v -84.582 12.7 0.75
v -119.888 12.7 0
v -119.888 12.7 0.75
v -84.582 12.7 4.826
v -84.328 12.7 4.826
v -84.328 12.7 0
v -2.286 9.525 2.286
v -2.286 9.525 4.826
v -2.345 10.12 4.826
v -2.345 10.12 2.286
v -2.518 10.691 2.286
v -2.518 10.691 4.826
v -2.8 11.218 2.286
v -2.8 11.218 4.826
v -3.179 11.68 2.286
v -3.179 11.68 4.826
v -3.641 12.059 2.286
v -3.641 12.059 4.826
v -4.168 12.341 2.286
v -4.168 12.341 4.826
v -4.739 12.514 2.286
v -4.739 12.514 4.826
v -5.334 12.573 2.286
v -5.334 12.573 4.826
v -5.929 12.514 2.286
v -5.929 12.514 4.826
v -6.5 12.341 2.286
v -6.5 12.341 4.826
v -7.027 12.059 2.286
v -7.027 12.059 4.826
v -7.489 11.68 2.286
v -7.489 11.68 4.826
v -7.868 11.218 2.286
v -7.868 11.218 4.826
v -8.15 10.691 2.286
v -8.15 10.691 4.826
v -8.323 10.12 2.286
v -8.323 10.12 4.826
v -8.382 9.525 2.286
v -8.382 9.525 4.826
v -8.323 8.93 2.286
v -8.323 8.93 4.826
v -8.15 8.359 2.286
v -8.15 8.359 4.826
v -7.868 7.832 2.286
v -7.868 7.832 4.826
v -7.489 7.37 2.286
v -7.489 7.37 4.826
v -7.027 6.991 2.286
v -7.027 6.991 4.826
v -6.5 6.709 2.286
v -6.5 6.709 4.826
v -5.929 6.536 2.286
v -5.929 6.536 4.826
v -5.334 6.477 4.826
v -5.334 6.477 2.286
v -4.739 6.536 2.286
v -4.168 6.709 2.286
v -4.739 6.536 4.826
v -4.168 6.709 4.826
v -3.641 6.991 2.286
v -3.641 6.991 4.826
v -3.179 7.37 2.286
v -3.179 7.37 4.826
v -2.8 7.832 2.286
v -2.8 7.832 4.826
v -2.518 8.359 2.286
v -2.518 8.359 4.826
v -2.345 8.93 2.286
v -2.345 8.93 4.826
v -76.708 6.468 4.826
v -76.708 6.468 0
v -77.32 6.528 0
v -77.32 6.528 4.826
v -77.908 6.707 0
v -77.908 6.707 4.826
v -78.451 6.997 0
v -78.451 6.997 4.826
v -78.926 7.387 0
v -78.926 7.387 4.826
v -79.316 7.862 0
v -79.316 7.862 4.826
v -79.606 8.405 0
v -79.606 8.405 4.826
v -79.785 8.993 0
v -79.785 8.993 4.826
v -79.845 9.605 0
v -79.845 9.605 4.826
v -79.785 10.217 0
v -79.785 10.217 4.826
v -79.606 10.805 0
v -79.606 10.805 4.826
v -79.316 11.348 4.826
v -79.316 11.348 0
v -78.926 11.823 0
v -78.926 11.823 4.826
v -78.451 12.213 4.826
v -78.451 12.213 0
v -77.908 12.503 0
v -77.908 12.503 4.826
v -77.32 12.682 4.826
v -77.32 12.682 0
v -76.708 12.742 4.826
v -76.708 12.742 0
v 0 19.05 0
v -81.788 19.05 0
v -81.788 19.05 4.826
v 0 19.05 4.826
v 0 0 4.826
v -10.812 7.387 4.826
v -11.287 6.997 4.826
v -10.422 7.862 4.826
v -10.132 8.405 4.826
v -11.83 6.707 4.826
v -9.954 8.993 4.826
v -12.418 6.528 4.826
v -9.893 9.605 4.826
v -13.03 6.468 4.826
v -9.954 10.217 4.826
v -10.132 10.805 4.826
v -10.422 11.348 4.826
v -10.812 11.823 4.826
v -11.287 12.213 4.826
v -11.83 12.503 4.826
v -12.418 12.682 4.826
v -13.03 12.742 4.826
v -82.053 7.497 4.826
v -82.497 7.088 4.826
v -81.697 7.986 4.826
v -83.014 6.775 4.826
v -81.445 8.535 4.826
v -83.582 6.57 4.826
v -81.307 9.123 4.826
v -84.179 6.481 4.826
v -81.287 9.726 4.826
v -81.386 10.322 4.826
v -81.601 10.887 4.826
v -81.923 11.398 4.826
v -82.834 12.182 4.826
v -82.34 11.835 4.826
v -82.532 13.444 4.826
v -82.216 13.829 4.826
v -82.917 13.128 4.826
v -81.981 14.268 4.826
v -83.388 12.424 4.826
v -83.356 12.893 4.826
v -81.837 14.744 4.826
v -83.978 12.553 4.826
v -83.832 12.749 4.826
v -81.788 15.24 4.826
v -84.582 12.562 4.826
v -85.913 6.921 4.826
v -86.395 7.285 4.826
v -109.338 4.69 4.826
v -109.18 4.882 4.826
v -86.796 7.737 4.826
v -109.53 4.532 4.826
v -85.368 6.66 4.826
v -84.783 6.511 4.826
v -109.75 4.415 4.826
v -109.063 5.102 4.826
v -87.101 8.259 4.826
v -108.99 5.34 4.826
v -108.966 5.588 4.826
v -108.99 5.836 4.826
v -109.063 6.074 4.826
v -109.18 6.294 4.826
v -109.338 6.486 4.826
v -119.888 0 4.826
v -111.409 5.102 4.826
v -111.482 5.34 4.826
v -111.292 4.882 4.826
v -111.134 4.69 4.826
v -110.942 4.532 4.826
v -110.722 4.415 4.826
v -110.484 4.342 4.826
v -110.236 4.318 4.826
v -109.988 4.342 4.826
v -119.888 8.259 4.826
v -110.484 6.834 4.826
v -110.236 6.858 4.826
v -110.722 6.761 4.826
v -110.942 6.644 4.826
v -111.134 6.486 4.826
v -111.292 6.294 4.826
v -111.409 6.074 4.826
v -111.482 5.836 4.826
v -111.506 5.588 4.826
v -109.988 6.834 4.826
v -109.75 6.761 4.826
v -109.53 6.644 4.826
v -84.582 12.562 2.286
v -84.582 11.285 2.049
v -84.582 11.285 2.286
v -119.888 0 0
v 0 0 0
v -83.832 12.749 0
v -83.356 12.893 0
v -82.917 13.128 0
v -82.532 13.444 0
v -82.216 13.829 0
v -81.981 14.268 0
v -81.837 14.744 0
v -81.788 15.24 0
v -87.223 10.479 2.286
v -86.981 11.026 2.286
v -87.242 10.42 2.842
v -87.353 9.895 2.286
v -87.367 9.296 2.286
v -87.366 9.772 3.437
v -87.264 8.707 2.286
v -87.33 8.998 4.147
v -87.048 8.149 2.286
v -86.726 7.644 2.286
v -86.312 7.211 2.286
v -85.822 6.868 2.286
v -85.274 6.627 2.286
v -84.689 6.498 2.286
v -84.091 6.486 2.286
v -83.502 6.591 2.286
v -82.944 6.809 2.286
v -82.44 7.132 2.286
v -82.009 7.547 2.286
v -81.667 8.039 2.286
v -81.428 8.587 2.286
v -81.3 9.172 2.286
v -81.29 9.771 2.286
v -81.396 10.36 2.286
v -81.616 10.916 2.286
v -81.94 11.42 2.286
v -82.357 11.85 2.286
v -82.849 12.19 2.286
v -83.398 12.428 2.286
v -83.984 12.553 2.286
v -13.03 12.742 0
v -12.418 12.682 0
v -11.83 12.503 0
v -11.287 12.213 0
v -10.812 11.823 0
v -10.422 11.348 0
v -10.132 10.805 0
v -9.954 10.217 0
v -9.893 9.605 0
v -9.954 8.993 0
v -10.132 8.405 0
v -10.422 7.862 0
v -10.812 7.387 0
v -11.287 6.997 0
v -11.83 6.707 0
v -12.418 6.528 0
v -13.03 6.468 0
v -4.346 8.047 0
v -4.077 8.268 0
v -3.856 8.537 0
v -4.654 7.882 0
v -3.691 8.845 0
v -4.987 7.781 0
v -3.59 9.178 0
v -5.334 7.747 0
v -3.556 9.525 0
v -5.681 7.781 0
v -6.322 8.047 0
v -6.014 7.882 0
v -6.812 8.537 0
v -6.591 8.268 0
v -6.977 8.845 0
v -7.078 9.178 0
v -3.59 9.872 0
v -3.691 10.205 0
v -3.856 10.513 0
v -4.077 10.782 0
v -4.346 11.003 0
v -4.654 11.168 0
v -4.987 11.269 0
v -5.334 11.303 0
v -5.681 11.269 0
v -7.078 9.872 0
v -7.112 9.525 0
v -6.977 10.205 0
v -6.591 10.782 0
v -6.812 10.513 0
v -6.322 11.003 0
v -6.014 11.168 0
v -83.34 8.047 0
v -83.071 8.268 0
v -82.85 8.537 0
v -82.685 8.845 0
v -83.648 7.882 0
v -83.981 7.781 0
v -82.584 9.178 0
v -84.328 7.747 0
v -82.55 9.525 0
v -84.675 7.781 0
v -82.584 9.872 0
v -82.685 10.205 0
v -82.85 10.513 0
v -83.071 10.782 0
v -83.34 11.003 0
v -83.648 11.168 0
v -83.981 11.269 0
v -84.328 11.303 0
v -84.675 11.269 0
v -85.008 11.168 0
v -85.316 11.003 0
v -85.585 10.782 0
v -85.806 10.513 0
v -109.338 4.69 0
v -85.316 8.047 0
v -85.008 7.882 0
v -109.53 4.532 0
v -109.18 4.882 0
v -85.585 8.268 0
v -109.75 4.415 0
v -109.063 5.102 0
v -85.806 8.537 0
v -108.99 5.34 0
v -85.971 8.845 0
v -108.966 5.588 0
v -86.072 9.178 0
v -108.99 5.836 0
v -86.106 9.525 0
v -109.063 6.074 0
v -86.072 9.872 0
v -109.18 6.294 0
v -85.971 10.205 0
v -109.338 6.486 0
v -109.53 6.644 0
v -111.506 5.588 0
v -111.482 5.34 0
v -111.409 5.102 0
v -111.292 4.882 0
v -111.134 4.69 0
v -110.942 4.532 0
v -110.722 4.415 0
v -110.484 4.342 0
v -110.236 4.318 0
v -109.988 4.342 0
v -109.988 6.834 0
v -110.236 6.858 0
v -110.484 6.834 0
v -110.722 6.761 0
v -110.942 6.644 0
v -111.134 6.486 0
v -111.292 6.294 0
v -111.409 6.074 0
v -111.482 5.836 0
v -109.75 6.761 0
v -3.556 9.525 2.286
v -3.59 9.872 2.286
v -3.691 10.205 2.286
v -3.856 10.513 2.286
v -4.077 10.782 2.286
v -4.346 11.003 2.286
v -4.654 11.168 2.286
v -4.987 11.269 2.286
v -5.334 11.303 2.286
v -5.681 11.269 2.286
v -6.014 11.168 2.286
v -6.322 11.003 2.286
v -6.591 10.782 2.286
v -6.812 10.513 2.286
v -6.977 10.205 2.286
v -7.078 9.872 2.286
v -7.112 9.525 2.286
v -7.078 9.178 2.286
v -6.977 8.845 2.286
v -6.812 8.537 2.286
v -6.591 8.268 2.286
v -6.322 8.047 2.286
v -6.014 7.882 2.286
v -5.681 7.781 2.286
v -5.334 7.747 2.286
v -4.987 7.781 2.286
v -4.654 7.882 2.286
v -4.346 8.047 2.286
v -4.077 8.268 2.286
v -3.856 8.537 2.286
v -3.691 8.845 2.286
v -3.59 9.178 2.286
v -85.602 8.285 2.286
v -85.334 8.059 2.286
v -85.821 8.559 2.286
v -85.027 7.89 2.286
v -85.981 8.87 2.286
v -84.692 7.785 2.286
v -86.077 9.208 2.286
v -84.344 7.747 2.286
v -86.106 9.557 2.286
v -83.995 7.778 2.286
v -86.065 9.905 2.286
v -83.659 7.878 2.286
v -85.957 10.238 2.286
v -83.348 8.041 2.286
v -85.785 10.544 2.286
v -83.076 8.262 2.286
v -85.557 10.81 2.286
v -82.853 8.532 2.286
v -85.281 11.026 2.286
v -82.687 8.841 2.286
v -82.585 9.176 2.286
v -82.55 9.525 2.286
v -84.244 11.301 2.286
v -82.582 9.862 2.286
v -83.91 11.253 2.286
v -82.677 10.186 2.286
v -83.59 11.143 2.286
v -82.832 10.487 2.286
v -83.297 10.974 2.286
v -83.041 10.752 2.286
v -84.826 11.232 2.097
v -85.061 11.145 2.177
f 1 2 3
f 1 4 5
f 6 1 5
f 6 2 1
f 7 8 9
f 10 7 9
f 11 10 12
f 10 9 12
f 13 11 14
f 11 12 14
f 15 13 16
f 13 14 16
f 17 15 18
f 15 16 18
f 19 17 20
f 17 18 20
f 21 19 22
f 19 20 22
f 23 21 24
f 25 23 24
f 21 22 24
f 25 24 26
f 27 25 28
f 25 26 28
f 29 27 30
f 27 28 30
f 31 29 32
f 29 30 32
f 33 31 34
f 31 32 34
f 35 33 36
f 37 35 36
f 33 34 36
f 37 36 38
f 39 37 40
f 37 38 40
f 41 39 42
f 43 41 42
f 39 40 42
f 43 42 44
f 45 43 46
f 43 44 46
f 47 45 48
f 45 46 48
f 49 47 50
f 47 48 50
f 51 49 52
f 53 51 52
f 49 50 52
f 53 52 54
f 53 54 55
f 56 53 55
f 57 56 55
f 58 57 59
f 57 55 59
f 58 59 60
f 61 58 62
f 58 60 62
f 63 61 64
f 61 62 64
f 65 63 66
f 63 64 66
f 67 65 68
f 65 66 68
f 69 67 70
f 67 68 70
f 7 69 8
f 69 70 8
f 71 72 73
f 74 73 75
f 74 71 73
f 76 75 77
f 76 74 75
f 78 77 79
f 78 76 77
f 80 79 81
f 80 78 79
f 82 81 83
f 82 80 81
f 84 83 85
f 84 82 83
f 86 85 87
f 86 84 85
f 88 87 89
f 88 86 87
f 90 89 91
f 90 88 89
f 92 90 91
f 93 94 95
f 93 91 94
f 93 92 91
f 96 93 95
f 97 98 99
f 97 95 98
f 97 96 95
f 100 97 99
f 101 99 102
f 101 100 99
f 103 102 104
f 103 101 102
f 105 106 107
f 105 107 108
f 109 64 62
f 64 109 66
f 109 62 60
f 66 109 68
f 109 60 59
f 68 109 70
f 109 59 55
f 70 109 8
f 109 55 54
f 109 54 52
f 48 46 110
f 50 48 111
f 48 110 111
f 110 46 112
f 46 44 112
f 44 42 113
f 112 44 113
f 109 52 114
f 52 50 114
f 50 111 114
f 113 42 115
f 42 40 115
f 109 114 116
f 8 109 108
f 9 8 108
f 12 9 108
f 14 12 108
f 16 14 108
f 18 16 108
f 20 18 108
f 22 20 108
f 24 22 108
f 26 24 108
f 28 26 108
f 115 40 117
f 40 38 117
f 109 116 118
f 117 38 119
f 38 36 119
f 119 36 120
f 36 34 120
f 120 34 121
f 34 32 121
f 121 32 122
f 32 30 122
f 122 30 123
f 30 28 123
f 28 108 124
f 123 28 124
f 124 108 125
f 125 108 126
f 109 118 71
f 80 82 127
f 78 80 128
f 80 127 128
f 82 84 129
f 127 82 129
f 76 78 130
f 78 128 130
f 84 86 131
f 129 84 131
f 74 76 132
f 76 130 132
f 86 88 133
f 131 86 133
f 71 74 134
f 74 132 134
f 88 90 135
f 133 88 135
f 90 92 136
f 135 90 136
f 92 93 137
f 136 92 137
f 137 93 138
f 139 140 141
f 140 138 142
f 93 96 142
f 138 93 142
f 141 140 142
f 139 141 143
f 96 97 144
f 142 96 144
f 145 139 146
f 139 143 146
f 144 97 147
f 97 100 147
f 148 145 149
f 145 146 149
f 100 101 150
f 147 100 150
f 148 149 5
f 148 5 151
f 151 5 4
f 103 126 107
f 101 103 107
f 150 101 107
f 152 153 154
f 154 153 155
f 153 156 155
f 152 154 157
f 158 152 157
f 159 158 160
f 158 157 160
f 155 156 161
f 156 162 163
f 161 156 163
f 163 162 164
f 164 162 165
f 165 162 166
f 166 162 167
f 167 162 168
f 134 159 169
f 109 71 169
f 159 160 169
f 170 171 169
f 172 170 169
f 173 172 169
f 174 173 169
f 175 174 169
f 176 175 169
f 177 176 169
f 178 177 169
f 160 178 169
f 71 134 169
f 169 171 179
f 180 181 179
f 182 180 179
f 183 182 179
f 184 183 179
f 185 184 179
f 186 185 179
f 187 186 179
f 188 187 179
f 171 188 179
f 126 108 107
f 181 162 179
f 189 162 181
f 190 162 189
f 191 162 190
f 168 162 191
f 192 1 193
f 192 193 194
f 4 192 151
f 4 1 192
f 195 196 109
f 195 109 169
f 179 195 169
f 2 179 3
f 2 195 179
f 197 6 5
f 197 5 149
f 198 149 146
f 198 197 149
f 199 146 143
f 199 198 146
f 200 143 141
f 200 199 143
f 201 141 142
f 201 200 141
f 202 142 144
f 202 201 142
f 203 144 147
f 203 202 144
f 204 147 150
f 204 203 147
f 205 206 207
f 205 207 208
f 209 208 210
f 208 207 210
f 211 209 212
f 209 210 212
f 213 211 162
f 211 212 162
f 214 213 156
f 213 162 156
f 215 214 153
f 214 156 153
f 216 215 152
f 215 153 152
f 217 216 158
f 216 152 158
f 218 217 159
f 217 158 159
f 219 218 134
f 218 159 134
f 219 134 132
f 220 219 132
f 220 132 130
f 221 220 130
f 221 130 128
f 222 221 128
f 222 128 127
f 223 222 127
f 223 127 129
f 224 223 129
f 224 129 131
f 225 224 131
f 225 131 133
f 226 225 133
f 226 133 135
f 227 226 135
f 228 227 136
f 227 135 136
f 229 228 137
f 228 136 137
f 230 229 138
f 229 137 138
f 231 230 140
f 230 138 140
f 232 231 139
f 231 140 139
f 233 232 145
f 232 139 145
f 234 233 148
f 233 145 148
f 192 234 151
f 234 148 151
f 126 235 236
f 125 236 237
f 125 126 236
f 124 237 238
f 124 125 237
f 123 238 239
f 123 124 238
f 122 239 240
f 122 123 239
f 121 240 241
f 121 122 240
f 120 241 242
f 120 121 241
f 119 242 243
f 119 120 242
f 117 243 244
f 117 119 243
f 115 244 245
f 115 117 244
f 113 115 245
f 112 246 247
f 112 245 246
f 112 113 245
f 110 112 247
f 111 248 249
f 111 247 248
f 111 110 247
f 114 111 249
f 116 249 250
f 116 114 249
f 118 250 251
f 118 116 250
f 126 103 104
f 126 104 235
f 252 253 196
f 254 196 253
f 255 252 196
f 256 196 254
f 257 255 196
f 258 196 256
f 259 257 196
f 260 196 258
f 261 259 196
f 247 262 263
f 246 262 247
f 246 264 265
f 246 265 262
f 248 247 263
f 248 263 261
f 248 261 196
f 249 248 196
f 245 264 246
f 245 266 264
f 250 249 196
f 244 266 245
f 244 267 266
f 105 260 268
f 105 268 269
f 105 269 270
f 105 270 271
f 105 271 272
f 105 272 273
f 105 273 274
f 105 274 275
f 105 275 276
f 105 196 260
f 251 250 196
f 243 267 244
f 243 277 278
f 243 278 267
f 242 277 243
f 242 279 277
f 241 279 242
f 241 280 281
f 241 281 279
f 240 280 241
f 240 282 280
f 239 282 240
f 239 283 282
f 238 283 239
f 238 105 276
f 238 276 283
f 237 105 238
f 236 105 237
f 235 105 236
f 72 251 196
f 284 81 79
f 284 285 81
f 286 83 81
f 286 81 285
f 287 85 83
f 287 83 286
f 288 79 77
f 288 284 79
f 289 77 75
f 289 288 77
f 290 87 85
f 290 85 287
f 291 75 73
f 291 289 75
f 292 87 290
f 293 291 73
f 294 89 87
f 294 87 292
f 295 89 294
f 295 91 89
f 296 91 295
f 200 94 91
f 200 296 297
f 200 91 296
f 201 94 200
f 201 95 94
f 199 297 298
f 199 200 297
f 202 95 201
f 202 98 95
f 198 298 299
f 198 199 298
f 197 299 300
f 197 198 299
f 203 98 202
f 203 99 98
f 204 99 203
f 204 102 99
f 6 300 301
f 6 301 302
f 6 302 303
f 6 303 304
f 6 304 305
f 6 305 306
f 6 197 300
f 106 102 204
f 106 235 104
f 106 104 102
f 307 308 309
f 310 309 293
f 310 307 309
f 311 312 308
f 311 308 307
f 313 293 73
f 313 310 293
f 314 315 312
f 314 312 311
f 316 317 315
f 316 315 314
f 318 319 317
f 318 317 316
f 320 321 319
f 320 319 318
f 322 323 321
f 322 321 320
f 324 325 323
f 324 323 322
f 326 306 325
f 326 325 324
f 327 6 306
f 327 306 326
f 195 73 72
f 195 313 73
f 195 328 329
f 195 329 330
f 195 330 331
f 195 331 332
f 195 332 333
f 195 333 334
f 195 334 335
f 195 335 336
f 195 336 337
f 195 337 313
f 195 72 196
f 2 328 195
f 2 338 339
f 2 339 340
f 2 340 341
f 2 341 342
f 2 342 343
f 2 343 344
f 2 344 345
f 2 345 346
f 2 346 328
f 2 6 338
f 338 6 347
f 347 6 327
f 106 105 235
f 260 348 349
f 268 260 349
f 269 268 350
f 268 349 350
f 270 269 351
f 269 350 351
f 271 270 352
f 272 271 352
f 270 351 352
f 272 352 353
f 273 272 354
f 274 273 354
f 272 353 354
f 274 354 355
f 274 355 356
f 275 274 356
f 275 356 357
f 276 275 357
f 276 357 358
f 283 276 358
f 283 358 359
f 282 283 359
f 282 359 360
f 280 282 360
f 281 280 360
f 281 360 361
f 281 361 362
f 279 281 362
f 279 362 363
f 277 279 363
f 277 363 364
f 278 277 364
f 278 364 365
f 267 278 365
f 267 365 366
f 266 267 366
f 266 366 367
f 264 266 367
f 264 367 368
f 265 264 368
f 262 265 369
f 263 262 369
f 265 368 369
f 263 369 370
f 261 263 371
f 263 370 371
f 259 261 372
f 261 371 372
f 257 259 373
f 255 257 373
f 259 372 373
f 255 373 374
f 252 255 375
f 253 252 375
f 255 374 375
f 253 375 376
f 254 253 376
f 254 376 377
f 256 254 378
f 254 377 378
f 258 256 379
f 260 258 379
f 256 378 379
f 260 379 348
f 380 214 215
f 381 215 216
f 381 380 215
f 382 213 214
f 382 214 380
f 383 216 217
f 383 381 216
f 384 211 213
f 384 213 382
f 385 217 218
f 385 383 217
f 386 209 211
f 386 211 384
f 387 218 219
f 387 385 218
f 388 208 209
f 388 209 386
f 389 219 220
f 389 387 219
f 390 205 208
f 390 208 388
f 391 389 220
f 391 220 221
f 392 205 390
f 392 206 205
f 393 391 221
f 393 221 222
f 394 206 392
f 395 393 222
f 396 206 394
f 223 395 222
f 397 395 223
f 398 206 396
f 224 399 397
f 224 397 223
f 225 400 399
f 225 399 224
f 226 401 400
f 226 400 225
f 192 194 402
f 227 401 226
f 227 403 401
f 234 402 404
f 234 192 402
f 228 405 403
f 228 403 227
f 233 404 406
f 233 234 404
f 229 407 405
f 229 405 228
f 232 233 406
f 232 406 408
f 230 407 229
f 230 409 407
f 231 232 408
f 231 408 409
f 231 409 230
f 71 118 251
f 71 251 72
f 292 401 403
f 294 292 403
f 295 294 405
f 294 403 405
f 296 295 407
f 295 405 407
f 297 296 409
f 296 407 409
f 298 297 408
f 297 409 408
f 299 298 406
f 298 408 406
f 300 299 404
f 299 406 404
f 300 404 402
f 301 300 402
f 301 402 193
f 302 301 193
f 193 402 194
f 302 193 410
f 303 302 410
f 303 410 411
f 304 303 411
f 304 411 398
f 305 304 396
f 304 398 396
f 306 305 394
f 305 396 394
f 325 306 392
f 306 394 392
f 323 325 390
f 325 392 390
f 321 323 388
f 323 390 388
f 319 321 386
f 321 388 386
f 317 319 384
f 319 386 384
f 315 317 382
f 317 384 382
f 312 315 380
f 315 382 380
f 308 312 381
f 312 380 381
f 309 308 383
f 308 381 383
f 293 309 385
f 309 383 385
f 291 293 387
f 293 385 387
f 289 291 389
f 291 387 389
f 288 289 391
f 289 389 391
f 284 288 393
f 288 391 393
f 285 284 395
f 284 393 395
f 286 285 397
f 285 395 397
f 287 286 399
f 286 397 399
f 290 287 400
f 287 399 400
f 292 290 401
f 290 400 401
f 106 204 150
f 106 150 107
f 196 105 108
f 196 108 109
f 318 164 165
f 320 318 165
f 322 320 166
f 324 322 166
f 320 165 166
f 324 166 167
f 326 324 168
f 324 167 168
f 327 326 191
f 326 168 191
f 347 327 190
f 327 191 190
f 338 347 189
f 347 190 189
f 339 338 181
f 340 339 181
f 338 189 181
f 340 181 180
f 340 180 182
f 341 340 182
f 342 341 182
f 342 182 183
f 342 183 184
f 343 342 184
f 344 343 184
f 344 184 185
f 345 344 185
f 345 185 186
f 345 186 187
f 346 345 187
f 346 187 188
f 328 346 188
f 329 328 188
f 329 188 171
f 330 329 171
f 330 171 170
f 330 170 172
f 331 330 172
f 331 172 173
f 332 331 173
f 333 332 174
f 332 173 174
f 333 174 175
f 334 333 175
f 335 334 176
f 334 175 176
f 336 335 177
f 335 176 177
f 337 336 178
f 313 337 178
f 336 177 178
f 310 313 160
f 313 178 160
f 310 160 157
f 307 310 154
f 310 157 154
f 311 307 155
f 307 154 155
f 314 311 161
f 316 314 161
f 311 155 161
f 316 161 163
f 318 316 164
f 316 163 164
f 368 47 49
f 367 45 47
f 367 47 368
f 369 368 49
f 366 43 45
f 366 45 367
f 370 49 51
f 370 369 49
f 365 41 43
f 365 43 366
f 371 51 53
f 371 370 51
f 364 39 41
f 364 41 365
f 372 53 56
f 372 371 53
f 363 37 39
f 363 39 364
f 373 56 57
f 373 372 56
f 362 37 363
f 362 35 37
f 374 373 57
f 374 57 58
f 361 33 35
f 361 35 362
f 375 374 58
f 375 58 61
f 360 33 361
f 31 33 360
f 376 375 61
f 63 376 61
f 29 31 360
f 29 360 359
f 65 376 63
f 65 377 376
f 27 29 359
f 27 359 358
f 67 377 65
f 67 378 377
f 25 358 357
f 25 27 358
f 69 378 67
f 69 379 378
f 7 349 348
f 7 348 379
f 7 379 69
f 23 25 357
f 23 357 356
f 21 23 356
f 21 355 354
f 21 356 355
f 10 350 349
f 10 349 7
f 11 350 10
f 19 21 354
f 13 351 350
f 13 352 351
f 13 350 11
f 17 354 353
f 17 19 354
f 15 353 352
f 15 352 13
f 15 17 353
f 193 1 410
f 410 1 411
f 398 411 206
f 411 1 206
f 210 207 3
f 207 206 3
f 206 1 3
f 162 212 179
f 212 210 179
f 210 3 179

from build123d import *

# Parameters (mm, degrees)
BOSS_EXTRUDE1_DEPTH = 4.826
CUT_EXTRUDE1_DEPTH  = 35.306
SKETCH3_R           = 3.048
CUT_EXTRUDE2_DEPTH  = 2.54
SKETCH4_R           = 1.778
SKETCH4_R_2         = 1.27
CUT_EXTRUDE3_DEPTH  = 5.826
CUT_EXTRUDE4_DEPTH  = 5.826


with BuildPart() as part:
    # Sketch1 → Boss-Extrude1 (new body)
    with BuildSketch(Plane.XY):
        with BuildLine():
            Line((0, 0), (-119.888, 0))
            Line((-119.888, 0), (-119.888, 12.7))
            Line((-119.888, 12.7), (-84.328, 12.7))
            ThreePointArc((-84.328, 12.7), (-82.531948776, 13.443948776), (-81.788, 15.24))
            Line((-81.788, 15.24), (-81.788, 19.05))
            Line((-81.788, 19.05), (0, 19.05))
            Line((0, 19.05), (0, 0))
        make_face()
    extrude(amount=BOSS_EXTRUDE1_DEPTH)

    # Sketch2 → Cut-Extrude1 (cut)
    with BuildSketch(Plane.ZY.offset(119.888)):
        Polygon((0.74979355, 12.7), (4.826, 8.258695089), (4.826, 12.7), align=None)
    extrude(amount=-CUT_EXTRUDE1_DEPTH, mode=Mode.SUBTRACT)

    # Sketch3 → Cut-Extrude2 (cut)
    with BuildSketch(Plane.XY.offset(4.826)):
        with Locations((-5.334, 9.525)):
            Circle(SKETCH3_R)
        with Locations((-84.328, 9.525)):
            Circle(SKETCH3_R)
    extrude(amount=-CUT_EXTRUDE2_DEPTH, mode=Mode.SUBTRACT)

    # Sketch4 → Cut-Extrude3 (cut, through all)
    with BuildSketch(Plane.XY.offset(4.826)):
        with Locations((-5.334, 9.525)):
            Circle(SKETCH4_R)
        with Locations((-84.328, 9.525)):
            Circle(SKETCH4_R)
        with Locations((-110.236, 5.588)):
            Circle(SKETCH4_R_2)
    extrude(amount=-CUT_EXTRUDE3_DEPTH, mode=Mode.SUBTRACT)

    # Sketch5 → Cut-Extrude4 (cut, through all)
    with BuildSketch(Plane.XY.offset(4.826)):
        with BuildLine():
            Line((-76.708, 12.741907021), (-13.0302, 12.741907021))
            ThreePointArc((-13.0302, 12.741907021), (-9.8933, 9.605007021), (-13.0302, 6.468107021))
            Line((-13.0302, 6.468107021), (-76.708, 6.468107021))
            ThreePointArc((-76.708, 6.468107021), (-79.8449, 9.605007021), (-76.708, 12.741907021))
        make_face()
    extrude(amount=-CUT_EXTRUDE4_DEPTH, mode=Mode.SUBTRACT)


solid = part.part
